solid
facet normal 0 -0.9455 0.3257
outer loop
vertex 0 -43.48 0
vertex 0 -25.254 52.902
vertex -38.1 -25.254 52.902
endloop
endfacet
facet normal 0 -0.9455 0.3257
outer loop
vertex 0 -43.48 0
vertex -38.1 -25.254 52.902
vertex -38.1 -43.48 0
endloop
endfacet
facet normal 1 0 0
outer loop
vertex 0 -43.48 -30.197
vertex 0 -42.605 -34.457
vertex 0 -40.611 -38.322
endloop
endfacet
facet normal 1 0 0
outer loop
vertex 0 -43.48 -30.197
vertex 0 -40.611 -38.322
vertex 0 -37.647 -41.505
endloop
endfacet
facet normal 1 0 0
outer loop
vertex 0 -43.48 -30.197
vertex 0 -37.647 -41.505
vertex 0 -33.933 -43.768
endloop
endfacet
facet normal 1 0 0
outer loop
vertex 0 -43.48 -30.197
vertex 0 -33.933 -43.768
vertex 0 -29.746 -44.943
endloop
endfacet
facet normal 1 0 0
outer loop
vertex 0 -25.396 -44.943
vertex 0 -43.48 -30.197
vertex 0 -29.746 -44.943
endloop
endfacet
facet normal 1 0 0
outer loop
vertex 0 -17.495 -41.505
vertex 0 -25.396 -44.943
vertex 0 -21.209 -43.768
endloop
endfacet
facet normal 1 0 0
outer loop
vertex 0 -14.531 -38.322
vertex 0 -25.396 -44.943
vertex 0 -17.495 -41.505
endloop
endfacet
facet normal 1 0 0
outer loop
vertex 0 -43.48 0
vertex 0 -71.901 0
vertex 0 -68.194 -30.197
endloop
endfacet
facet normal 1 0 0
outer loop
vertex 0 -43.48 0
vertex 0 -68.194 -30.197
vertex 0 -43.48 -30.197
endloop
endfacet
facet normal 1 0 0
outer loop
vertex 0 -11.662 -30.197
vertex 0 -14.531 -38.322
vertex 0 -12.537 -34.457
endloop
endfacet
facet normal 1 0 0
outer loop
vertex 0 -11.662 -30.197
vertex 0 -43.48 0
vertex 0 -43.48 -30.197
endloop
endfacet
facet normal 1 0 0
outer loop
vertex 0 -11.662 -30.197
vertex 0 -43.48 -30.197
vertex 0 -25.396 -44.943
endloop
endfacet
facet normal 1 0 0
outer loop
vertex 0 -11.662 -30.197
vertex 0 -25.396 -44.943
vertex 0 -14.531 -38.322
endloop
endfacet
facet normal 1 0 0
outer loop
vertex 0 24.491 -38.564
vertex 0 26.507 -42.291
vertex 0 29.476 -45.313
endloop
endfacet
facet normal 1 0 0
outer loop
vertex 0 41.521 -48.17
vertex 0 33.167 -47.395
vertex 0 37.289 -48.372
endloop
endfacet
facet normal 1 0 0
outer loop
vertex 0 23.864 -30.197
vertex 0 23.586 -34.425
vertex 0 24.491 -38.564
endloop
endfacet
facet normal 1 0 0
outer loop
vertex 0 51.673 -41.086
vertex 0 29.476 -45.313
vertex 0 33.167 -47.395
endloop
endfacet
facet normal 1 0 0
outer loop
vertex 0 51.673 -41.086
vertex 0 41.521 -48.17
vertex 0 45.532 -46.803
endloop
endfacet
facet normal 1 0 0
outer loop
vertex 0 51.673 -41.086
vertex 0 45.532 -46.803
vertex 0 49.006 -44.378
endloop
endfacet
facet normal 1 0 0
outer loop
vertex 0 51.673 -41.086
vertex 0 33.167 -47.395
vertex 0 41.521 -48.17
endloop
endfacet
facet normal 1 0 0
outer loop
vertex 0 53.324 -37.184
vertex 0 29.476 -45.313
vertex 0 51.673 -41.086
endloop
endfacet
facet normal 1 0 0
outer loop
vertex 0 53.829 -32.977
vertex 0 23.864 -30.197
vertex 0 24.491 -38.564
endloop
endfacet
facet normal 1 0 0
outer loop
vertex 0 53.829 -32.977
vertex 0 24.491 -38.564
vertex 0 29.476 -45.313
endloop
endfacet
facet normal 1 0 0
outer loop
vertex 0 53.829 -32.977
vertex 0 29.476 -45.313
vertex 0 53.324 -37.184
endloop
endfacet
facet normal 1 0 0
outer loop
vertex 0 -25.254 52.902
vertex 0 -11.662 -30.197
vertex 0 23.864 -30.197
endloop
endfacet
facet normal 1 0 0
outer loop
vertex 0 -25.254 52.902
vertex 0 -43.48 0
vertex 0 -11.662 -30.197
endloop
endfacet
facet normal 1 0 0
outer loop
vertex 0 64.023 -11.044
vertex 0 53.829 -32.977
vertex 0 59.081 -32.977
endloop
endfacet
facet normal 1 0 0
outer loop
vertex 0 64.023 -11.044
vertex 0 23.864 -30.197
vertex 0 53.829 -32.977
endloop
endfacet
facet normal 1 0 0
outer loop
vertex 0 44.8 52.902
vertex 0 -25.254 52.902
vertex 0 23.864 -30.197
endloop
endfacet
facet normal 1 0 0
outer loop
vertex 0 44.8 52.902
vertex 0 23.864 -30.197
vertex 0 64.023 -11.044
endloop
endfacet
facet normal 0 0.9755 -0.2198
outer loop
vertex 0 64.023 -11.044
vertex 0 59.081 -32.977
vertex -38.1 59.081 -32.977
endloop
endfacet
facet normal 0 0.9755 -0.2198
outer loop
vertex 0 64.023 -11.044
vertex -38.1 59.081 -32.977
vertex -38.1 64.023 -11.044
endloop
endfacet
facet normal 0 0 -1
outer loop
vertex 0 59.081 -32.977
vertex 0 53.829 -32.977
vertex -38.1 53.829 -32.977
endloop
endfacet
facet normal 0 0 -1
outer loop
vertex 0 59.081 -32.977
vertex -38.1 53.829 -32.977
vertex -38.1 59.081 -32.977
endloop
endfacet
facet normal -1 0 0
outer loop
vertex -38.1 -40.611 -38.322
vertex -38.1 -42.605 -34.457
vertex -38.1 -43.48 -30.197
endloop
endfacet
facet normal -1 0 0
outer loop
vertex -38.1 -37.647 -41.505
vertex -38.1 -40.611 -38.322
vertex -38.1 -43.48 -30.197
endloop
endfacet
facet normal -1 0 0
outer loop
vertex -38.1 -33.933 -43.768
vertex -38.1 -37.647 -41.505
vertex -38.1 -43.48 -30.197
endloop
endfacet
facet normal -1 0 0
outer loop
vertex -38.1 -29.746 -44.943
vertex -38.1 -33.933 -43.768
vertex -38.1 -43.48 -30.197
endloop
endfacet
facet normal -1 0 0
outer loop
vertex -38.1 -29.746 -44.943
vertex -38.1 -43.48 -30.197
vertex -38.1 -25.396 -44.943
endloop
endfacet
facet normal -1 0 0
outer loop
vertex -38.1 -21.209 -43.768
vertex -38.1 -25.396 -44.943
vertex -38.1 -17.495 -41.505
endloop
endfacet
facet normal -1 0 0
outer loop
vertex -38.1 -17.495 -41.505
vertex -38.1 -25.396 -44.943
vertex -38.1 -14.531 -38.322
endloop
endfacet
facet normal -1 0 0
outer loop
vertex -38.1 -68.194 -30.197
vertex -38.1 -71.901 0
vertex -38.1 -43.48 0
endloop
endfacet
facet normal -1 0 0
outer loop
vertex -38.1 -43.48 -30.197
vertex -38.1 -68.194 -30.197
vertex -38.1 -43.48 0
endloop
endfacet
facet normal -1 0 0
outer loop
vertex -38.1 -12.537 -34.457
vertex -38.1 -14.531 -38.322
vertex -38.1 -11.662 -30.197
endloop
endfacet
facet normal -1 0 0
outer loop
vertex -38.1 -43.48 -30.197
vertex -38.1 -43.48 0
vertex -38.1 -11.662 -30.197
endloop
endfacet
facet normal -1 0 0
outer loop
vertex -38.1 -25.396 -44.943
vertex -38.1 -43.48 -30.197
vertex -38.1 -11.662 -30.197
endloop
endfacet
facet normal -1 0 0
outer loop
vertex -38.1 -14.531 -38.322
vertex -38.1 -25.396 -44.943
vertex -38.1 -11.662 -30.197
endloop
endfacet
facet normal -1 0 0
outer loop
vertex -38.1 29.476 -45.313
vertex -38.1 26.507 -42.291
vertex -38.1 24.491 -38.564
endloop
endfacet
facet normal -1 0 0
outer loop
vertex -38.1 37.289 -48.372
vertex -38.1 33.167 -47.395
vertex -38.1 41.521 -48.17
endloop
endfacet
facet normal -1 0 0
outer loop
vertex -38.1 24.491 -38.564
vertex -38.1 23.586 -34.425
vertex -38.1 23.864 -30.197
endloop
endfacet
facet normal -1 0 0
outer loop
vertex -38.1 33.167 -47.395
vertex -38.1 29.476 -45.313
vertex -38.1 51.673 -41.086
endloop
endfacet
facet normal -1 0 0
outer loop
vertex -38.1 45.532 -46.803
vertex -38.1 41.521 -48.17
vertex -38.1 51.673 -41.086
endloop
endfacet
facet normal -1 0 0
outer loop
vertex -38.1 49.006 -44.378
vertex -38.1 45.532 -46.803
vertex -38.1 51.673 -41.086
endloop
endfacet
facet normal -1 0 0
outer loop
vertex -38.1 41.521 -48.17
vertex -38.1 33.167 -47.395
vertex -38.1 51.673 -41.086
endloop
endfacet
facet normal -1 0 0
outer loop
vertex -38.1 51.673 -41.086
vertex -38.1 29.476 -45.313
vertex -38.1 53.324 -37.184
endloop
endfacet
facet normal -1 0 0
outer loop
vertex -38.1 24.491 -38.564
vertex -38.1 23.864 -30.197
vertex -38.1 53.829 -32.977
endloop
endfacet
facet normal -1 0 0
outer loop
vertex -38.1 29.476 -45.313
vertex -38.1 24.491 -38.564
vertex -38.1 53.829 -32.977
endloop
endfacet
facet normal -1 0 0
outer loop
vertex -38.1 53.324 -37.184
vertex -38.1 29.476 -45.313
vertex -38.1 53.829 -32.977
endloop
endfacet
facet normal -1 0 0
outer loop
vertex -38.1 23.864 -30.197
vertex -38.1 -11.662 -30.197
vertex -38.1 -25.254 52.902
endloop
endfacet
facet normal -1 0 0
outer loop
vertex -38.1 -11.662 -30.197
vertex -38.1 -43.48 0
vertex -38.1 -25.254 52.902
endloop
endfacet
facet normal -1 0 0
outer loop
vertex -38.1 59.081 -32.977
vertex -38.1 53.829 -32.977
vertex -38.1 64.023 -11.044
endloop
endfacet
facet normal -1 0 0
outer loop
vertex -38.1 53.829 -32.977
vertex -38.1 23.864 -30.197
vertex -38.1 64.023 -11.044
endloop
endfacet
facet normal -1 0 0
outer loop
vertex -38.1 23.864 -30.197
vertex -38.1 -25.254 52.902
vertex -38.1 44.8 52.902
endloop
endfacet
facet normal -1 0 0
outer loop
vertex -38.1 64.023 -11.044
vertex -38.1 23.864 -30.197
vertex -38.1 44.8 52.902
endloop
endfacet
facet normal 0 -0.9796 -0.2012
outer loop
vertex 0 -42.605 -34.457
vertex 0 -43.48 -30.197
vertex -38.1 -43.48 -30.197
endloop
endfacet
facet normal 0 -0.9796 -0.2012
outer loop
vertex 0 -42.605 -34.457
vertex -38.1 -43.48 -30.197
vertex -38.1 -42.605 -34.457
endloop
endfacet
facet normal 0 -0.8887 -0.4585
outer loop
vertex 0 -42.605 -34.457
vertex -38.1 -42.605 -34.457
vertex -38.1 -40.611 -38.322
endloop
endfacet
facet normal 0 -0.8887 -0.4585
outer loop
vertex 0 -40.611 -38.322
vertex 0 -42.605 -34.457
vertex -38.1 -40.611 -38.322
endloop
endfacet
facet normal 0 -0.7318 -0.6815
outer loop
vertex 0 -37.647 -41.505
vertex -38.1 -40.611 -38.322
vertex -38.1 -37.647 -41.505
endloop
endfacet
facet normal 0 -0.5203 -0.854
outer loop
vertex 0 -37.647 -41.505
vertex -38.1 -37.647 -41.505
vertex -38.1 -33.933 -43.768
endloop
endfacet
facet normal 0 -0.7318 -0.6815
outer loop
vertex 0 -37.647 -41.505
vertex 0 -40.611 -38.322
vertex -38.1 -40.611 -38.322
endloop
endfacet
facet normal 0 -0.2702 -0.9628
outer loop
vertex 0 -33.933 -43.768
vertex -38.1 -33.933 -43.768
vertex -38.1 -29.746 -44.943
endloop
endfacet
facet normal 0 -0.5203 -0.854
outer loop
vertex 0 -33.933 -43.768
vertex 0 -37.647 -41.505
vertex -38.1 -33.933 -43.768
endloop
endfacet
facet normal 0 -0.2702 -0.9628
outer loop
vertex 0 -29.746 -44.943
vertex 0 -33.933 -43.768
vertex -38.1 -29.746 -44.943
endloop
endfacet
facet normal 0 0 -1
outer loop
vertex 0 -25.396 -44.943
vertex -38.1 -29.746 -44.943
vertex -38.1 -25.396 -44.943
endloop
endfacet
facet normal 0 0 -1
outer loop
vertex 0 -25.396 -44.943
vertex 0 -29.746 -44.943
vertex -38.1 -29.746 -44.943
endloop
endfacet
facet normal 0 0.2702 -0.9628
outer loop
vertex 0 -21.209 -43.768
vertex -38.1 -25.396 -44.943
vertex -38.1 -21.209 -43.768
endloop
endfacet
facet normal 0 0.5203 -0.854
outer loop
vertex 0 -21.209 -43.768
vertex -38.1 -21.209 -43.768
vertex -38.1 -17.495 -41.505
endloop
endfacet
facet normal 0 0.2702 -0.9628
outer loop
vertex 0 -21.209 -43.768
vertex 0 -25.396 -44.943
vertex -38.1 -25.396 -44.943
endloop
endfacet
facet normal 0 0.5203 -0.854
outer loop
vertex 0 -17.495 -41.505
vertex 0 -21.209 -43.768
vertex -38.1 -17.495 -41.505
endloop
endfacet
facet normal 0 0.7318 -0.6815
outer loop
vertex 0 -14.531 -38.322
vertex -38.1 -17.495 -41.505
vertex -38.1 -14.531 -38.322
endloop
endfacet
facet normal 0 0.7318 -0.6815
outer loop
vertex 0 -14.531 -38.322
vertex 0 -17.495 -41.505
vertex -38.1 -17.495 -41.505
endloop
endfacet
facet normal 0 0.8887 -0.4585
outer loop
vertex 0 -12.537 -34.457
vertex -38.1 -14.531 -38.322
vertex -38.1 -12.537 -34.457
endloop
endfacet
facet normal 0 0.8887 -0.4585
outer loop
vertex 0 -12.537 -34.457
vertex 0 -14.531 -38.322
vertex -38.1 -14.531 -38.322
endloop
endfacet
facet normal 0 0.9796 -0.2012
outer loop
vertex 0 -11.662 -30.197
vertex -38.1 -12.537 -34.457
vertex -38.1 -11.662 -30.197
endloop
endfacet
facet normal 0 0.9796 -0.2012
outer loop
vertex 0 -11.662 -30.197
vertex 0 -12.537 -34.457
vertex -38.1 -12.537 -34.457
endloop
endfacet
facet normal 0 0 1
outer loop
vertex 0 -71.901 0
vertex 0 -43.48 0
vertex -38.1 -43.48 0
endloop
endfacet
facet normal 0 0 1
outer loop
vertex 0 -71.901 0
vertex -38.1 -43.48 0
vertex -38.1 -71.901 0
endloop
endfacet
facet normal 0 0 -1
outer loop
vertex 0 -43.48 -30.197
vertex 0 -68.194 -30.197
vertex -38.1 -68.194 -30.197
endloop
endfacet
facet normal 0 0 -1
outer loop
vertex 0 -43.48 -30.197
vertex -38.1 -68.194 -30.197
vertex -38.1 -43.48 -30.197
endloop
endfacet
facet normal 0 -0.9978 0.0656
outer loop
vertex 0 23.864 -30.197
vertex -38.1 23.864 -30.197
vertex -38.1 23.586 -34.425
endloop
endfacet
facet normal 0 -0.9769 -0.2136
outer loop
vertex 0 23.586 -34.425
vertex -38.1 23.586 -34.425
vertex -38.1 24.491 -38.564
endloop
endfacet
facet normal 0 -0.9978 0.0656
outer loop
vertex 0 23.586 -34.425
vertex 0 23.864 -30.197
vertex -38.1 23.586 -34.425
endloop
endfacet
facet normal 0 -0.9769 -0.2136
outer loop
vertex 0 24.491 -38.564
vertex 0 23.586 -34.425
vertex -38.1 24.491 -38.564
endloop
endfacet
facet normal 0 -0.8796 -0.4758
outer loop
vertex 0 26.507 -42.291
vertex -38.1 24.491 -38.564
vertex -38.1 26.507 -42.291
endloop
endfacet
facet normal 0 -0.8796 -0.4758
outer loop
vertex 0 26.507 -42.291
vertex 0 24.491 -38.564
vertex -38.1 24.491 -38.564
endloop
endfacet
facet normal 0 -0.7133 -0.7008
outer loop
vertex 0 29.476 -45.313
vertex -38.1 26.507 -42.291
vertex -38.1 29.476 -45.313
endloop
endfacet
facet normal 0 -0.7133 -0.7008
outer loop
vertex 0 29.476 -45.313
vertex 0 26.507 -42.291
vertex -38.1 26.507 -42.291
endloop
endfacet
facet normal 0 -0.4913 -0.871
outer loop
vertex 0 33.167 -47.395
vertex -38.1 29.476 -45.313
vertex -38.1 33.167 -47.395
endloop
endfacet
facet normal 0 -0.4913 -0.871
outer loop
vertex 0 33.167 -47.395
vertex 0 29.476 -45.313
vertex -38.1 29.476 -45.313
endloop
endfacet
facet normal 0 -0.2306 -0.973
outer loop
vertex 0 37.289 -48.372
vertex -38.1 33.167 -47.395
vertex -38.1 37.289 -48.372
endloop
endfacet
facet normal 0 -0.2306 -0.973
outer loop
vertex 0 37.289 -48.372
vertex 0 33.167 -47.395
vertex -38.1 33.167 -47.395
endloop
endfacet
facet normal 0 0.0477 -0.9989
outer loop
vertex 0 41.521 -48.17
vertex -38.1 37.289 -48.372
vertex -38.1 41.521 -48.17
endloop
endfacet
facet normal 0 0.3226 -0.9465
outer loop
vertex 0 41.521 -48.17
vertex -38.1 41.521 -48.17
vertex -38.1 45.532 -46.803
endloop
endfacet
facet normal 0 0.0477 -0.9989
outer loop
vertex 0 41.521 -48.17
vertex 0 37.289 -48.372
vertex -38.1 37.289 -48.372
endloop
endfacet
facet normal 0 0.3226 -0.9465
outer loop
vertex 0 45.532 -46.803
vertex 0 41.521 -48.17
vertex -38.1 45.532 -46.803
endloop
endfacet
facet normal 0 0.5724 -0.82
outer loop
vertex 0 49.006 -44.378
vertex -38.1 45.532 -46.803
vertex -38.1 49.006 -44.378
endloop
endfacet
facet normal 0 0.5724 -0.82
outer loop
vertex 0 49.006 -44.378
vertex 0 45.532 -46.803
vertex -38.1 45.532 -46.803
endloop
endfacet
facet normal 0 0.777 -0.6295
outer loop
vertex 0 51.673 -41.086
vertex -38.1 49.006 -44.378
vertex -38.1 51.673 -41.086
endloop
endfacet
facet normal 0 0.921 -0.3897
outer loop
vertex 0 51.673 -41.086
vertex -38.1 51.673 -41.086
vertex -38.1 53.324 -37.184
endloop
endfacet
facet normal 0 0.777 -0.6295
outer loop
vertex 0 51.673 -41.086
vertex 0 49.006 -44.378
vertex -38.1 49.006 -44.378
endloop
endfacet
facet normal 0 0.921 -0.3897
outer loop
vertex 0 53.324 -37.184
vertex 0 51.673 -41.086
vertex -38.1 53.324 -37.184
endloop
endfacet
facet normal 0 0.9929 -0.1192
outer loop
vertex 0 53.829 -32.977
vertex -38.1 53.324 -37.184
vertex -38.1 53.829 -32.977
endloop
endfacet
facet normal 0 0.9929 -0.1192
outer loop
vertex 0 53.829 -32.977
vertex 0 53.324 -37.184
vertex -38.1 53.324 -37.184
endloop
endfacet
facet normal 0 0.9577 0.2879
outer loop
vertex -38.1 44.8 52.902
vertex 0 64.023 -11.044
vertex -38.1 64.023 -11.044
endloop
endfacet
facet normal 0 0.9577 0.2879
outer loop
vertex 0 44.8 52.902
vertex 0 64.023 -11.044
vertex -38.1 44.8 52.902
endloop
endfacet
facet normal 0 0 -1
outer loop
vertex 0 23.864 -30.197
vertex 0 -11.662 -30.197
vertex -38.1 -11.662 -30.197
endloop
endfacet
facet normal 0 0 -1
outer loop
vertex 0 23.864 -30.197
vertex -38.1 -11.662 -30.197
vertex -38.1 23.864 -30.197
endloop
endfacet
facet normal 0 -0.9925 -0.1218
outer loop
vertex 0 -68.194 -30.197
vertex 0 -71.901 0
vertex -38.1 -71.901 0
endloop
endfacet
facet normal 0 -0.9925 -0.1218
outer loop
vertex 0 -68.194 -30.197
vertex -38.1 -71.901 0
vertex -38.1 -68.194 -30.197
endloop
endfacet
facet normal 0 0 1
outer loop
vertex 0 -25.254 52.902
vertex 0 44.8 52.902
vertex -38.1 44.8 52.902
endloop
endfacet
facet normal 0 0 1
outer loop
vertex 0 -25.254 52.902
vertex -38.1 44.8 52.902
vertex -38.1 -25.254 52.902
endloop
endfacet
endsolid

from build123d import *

# Parameters (mm, degrees)
F1_DEPTH = 38.1


with BuildPart() as f1:
    # F0 (on Right) → F1 (new body)
    with BuildSketch(Plane.YZ):
        with BuildLine():
            Line((44.800351, 52.902363), (-25.254121, 52.902363))
            Line((-25.254121, 52.902363), (-43.48034, 0))
            Line((-43.48034, 0), (-71.900882, 0))
            Line((-71.900882, 0), (-68.193853, -30.196825))
            Line((-68.193853, -30.196825), (-43.48034, -30.196825))
            ThreePointArc((-43.48034, -30.196825), (-27.571015, -45.091976), (-11.661689, -30.196825))
            Line((-11.661689, -30.196825), (23.863986, -30.196825))
            ThreePointArc((23.863986, -30.196825), (37.289157, -48.372257), (53.829122, -32.977093))
            Line((53.829122, -32.977093), (59.080742, -32.977093))
            Line((59.080742, -32.977093), (64.023443, -11.043851))
            Line((64.023443, -11.043851), (44.800351, 52.902363))
        make_face()
    extrude(amount=-F1_DEPTH)


solid = f1.part
